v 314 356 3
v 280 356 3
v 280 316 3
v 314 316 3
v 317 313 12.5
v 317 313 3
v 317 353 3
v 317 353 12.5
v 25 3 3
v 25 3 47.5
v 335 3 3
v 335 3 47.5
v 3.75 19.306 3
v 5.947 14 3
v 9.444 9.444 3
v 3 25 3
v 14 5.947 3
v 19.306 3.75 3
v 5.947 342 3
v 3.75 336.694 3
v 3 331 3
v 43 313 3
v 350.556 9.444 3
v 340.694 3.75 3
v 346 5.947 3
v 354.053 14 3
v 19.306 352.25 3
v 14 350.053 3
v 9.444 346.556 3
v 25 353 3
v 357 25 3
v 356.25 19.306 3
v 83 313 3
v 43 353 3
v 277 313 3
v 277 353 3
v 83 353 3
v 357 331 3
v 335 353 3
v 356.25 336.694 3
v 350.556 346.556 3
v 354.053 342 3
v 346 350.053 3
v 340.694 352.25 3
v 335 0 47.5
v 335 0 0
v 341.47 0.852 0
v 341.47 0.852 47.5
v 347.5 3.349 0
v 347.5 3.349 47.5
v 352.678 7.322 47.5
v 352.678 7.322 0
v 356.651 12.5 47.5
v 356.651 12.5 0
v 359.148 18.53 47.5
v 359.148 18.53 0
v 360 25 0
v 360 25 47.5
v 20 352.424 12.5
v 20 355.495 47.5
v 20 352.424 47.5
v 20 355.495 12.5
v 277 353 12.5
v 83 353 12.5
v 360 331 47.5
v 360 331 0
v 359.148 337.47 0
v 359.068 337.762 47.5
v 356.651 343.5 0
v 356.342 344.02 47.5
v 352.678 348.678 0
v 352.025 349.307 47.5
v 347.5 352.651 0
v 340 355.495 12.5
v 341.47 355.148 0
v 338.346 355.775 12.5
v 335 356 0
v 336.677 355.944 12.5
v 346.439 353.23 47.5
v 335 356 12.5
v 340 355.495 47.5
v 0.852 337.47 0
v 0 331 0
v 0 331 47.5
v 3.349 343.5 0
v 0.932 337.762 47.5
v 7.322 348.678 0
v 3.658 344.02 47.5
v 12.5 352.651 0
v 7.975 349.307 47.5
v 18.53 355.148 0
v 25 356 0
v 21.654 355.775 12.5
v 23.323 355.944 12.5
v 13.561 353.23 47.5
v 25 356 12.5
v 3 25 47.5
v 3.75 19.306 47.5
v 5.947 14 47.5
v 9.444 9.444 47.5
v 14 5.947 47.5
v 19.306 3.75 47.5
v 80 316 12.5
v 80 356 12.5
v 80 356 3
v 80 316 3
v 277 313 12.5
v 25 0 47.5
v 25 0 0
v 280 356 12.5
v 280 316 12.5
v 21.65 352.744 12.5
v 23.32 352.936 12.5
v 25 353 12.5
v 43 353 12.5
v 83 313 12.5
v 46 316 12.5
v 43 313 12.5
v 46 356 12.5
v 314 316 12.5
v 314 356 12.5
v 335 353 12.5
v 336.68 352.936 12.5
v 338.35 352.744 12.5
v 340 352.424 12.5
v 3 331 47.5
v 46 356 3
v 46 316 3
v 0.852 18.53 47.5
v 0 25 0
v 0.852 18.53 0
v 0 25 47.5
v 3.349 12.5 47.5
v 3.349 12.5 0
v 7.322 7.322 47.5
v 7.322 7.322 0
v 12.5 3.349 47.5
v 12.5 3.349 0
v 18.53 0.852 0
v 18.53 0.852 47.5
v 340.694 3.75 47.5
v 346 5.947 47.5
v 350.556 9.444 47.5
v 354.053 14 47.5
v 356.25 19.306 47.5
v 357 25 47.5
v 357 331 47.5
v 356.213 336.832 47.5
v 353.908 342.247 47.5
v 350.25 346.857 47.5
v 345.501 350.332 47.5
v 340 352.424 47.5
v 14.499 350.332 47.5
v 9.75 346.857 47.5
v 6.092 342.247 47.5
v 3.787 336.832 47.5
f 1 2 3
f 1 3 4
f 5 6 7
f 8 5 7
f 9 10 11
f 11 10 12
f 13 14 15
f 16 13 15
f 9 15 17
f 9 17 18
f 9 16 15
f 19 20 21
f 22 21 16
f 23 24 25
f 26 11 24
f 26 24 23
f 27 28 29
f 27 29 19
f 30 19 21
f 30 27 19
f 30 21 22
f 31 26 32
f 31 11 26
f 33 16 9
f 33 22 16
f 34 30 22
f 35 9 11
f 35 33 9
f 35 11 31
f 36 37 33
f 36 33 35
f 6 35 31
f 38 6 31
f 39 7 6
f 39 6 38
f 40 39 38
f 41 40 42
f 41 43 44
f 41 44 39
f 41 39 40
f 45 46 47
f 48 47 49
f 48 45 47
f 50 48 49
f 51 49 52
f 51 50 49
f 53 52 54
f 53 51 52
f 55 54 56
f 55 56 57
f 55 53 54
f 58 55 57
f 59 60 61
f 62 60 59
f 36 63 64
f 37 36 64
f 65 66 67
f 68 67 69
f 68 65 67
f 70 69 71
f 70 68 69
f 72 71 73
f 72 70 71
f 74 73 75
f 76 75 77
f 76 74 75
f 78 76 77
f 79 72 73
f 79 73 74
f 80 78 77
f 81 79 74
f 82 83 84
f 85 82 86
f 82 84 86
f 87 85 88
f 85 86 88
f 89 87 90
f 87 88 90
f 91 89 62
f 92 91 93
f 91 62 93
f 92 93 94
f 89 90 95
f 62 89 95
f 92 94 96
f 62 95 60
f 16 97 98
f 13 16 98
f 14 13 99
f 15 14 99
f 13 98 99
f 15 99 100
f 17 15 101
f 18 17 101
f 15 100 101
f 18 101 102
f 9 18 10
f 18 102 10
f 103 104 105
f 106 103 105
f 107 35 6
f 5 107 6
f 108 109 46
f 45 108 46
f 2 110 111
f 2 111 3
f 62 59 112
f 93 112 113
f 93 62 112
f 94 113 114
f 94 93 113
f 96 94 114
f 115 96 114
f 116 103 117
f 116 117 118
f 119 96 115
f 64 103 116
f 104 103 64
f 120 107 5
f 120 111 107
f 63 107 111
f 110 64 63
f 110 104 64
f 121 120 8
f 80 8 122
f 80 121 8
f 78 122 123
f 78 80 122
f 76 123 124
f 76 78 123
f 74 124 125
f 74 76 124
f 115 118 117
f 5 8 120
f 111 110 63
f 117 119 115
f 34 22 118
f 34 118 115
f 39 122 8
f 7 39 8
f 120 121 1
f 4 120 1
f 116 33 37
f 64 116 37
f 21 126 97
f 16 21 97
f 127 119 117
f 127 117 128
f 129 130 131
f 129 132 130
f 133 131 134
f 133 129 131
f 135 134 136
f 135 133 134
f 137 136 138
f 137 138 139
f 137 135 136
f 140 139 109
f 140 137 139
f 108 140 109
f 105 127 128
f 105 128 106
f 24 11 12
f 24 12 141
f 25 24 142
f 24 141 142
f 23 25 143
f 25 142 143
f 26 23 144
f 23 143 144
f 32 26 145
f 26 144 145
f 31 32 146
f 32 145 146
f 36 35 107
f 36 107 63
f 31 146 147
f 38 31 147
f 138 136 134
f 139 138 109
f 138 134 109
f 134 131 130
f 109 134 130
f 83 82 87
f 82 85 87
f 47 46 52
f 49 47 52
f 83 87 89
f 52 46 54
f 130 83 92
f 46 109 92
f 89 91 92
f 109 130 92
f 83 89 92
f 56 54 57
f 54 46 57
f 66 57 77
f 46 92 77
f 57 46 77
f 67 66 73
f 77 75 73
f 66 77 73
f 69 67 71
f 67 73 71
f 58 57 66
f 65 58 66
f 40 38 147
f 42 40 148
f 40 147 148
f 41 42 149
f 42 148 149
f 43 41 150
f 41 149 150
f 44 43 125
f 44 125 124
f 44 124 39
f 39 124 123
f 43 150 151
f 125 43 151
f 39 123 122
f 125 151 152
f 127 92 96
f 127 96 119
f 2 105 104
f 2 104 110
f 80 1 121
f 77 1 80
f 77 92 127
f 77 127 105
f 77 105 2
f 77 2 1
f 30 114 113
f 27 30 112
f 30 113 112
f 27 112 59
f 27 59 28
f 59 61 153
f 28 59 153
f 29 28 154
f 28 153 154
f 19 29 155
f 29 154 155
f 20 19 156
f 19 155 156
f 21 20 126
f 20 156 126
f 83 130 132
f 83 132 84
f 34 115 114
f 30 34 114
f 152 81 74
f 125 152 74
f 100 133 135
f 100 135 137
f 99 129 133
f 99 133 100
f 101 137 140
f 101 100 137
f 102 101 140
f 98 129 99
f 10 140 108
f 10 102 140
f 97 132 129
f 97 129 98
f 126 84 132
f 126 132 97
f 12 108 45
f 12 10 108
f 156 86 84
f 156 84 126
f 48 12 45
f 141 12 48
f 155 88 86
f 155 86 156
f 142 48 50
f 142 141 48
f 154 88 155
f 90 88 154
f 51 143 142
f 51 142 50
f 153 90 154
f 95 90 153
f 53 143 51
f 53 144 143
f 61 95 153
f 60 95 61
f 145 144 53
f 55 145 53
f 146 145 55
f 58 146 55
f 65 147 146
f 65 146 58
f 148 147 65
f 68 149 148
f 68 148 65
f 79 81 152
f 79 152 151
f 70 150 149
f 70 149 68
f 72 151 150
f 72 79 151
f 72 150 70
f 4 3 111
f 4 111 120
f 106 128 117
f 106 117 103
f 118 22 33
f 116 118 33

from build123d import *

# Parameters (mm, degrees)
ESQUISSE1_W             = 360
ESQUISSE1_H             = 356
BOSS_EXTRU_1_DEPTH      = 47.5
CONG_1_R                = 25
ENL_V_MAT_EXTRU_1_DEPTH = 44.5
ESQUISSE3_W             = 320
ESQUISSE3_H             = 35
ENL_V_MAT_EXTRU_2_DEPTH = 10
ESQUISSE5_W             = 40
ESQUISSE5_H             = 40
ESQUISSE5_W_2           = 34
ESQUISSE5_H_2           = 34
EXTRU_MINCE1_DEPTH      = 9.5
ESQUISSE10_W            = 34
ESQUISSE10_H            = 9.5
ENL_V_MAT_EXTRU_4_DEPTH = 10
ESQUISSE13_W            = 34
ESQUISSE13_H            = 9.5
ENL_V_MAT_EXTRU_5_DEPTH = 10


with BuildPart() as part:
    # Esquisse1 → Boss.-Extru.1 (new body)
    with BuildSketch(Plane.XY):
        with Locations((180, 178)):
            Rectangle(ESQUISSE1_W, ESQUISSE1_H)
    extrude(amount=BOSS_EXTRU_1_DEPTH)

    # Congé1
    cong_1_edges = [part.edges().sort_by_distance(p)[0] for p in [
        (0, 356, 23.75),
        (360, 356, 23.75),
        (360, 0, 23.75),
        (0, 0, 23.75),
    ]]
    fillet(cong_1_edges, radius=CONG_1_R)

    # Esquisse2 → Enlèv. mat.-Extru.1 (cut)
    with BuildSketch(Plane.XY.offset(47.5)):
        with BuildLine():
            Line((3, 331), (3, 25))
            ThreePointArc((3, 25), (9.443650814, 9.443650814), (25, 3))
            Line((25, 3), (335, 3))
            ThreePointArc((335, 3), (350.556349186, 9.443650814), (357, 25))
            Line((357, 25), (357, 331))
            ThreePointArc((357, 331), (350.556349186, 346.556349186), (335, 353))
            Line((335, 353), (25, 353))
            ThreePointArc((25, 353), (9.443650814, 346.556349186), (3, 331))
        make_face()
    extrude(amount=-ENL_V_MAT_EXTRU_1_DEPTH, mode=Mode.SUBTRACT)

    # Esquisse3 → Enlèv. mat.-Extru.2 (cut)
    with BuildSketch(Plane(origin=(0, 356, 0), x_dir=(1, 0, 0), z_dir=(0, 1, 0))):
        with Locations((180, -30)):
            Rectangle(ESQUISSE3_W, ESQUISSE3_H)
    extrude(amount=-ENL_V_MAT_EXTRU_2_DEPTH, mode=Mode.SUBTRACT)

    # Esquisse5 → Extru.-Mince1 (add)
    with BuildSketch(Plane.XY.offset(3)):
        with Locations((63, 333)):
            Rectangle(ESQUISSE5_W, ESQUISSE5_H)
        with Locations((63, 333)):
            Rectangle(ESQUISSE5_W_2, ESQUISSE5_H_2, mode=Mode.SUBTRACT)
        with Locations((297, 333)):
            Rectangle(ESQUISSE5_W, ESQUISSE5_H)
        with Locations((297, 333)):
            Rectangle(ESQUISSE5_W_2, ESQUISSE5_H_2, mode=Mode.SUBTRACT)
    extrude(amount=EXTRU_MINCE1_DEPTH)

    # Esquisse10 → Enlèv. mat.-Extru.4 (cut)
    with BuildSketch(Plane(origin=(0, 356, 0), x_dir=(1, 0, 0), z_dir=(0, 1, 0))):
        with Locations((297, -7.75)):
            Rectangle(ESQUISSE10_W, ESQUISSE10_H)
    extrude(amount=-ENL_V_MAT_EXTRU_4_DEPTH, mode=Mode.SUBTRACT)

    # Esquisse13 → Enlèv. mat.-Extru.5 (cut)
    with BuildSketch(Plane(origin=(0, 356, 0), x_dir=(1, 0, 0), z_dir=(0, 1, 0))):
        with Locations((63, -7.75)):
            Rectangle(ESQUISSE13_W, ESQUISSE13_H)
    extrude(amount=-ENL_V_MAT_EXTRU_5_DEPTH, mode=Mode.SUBTRACT)


solid = part.part
